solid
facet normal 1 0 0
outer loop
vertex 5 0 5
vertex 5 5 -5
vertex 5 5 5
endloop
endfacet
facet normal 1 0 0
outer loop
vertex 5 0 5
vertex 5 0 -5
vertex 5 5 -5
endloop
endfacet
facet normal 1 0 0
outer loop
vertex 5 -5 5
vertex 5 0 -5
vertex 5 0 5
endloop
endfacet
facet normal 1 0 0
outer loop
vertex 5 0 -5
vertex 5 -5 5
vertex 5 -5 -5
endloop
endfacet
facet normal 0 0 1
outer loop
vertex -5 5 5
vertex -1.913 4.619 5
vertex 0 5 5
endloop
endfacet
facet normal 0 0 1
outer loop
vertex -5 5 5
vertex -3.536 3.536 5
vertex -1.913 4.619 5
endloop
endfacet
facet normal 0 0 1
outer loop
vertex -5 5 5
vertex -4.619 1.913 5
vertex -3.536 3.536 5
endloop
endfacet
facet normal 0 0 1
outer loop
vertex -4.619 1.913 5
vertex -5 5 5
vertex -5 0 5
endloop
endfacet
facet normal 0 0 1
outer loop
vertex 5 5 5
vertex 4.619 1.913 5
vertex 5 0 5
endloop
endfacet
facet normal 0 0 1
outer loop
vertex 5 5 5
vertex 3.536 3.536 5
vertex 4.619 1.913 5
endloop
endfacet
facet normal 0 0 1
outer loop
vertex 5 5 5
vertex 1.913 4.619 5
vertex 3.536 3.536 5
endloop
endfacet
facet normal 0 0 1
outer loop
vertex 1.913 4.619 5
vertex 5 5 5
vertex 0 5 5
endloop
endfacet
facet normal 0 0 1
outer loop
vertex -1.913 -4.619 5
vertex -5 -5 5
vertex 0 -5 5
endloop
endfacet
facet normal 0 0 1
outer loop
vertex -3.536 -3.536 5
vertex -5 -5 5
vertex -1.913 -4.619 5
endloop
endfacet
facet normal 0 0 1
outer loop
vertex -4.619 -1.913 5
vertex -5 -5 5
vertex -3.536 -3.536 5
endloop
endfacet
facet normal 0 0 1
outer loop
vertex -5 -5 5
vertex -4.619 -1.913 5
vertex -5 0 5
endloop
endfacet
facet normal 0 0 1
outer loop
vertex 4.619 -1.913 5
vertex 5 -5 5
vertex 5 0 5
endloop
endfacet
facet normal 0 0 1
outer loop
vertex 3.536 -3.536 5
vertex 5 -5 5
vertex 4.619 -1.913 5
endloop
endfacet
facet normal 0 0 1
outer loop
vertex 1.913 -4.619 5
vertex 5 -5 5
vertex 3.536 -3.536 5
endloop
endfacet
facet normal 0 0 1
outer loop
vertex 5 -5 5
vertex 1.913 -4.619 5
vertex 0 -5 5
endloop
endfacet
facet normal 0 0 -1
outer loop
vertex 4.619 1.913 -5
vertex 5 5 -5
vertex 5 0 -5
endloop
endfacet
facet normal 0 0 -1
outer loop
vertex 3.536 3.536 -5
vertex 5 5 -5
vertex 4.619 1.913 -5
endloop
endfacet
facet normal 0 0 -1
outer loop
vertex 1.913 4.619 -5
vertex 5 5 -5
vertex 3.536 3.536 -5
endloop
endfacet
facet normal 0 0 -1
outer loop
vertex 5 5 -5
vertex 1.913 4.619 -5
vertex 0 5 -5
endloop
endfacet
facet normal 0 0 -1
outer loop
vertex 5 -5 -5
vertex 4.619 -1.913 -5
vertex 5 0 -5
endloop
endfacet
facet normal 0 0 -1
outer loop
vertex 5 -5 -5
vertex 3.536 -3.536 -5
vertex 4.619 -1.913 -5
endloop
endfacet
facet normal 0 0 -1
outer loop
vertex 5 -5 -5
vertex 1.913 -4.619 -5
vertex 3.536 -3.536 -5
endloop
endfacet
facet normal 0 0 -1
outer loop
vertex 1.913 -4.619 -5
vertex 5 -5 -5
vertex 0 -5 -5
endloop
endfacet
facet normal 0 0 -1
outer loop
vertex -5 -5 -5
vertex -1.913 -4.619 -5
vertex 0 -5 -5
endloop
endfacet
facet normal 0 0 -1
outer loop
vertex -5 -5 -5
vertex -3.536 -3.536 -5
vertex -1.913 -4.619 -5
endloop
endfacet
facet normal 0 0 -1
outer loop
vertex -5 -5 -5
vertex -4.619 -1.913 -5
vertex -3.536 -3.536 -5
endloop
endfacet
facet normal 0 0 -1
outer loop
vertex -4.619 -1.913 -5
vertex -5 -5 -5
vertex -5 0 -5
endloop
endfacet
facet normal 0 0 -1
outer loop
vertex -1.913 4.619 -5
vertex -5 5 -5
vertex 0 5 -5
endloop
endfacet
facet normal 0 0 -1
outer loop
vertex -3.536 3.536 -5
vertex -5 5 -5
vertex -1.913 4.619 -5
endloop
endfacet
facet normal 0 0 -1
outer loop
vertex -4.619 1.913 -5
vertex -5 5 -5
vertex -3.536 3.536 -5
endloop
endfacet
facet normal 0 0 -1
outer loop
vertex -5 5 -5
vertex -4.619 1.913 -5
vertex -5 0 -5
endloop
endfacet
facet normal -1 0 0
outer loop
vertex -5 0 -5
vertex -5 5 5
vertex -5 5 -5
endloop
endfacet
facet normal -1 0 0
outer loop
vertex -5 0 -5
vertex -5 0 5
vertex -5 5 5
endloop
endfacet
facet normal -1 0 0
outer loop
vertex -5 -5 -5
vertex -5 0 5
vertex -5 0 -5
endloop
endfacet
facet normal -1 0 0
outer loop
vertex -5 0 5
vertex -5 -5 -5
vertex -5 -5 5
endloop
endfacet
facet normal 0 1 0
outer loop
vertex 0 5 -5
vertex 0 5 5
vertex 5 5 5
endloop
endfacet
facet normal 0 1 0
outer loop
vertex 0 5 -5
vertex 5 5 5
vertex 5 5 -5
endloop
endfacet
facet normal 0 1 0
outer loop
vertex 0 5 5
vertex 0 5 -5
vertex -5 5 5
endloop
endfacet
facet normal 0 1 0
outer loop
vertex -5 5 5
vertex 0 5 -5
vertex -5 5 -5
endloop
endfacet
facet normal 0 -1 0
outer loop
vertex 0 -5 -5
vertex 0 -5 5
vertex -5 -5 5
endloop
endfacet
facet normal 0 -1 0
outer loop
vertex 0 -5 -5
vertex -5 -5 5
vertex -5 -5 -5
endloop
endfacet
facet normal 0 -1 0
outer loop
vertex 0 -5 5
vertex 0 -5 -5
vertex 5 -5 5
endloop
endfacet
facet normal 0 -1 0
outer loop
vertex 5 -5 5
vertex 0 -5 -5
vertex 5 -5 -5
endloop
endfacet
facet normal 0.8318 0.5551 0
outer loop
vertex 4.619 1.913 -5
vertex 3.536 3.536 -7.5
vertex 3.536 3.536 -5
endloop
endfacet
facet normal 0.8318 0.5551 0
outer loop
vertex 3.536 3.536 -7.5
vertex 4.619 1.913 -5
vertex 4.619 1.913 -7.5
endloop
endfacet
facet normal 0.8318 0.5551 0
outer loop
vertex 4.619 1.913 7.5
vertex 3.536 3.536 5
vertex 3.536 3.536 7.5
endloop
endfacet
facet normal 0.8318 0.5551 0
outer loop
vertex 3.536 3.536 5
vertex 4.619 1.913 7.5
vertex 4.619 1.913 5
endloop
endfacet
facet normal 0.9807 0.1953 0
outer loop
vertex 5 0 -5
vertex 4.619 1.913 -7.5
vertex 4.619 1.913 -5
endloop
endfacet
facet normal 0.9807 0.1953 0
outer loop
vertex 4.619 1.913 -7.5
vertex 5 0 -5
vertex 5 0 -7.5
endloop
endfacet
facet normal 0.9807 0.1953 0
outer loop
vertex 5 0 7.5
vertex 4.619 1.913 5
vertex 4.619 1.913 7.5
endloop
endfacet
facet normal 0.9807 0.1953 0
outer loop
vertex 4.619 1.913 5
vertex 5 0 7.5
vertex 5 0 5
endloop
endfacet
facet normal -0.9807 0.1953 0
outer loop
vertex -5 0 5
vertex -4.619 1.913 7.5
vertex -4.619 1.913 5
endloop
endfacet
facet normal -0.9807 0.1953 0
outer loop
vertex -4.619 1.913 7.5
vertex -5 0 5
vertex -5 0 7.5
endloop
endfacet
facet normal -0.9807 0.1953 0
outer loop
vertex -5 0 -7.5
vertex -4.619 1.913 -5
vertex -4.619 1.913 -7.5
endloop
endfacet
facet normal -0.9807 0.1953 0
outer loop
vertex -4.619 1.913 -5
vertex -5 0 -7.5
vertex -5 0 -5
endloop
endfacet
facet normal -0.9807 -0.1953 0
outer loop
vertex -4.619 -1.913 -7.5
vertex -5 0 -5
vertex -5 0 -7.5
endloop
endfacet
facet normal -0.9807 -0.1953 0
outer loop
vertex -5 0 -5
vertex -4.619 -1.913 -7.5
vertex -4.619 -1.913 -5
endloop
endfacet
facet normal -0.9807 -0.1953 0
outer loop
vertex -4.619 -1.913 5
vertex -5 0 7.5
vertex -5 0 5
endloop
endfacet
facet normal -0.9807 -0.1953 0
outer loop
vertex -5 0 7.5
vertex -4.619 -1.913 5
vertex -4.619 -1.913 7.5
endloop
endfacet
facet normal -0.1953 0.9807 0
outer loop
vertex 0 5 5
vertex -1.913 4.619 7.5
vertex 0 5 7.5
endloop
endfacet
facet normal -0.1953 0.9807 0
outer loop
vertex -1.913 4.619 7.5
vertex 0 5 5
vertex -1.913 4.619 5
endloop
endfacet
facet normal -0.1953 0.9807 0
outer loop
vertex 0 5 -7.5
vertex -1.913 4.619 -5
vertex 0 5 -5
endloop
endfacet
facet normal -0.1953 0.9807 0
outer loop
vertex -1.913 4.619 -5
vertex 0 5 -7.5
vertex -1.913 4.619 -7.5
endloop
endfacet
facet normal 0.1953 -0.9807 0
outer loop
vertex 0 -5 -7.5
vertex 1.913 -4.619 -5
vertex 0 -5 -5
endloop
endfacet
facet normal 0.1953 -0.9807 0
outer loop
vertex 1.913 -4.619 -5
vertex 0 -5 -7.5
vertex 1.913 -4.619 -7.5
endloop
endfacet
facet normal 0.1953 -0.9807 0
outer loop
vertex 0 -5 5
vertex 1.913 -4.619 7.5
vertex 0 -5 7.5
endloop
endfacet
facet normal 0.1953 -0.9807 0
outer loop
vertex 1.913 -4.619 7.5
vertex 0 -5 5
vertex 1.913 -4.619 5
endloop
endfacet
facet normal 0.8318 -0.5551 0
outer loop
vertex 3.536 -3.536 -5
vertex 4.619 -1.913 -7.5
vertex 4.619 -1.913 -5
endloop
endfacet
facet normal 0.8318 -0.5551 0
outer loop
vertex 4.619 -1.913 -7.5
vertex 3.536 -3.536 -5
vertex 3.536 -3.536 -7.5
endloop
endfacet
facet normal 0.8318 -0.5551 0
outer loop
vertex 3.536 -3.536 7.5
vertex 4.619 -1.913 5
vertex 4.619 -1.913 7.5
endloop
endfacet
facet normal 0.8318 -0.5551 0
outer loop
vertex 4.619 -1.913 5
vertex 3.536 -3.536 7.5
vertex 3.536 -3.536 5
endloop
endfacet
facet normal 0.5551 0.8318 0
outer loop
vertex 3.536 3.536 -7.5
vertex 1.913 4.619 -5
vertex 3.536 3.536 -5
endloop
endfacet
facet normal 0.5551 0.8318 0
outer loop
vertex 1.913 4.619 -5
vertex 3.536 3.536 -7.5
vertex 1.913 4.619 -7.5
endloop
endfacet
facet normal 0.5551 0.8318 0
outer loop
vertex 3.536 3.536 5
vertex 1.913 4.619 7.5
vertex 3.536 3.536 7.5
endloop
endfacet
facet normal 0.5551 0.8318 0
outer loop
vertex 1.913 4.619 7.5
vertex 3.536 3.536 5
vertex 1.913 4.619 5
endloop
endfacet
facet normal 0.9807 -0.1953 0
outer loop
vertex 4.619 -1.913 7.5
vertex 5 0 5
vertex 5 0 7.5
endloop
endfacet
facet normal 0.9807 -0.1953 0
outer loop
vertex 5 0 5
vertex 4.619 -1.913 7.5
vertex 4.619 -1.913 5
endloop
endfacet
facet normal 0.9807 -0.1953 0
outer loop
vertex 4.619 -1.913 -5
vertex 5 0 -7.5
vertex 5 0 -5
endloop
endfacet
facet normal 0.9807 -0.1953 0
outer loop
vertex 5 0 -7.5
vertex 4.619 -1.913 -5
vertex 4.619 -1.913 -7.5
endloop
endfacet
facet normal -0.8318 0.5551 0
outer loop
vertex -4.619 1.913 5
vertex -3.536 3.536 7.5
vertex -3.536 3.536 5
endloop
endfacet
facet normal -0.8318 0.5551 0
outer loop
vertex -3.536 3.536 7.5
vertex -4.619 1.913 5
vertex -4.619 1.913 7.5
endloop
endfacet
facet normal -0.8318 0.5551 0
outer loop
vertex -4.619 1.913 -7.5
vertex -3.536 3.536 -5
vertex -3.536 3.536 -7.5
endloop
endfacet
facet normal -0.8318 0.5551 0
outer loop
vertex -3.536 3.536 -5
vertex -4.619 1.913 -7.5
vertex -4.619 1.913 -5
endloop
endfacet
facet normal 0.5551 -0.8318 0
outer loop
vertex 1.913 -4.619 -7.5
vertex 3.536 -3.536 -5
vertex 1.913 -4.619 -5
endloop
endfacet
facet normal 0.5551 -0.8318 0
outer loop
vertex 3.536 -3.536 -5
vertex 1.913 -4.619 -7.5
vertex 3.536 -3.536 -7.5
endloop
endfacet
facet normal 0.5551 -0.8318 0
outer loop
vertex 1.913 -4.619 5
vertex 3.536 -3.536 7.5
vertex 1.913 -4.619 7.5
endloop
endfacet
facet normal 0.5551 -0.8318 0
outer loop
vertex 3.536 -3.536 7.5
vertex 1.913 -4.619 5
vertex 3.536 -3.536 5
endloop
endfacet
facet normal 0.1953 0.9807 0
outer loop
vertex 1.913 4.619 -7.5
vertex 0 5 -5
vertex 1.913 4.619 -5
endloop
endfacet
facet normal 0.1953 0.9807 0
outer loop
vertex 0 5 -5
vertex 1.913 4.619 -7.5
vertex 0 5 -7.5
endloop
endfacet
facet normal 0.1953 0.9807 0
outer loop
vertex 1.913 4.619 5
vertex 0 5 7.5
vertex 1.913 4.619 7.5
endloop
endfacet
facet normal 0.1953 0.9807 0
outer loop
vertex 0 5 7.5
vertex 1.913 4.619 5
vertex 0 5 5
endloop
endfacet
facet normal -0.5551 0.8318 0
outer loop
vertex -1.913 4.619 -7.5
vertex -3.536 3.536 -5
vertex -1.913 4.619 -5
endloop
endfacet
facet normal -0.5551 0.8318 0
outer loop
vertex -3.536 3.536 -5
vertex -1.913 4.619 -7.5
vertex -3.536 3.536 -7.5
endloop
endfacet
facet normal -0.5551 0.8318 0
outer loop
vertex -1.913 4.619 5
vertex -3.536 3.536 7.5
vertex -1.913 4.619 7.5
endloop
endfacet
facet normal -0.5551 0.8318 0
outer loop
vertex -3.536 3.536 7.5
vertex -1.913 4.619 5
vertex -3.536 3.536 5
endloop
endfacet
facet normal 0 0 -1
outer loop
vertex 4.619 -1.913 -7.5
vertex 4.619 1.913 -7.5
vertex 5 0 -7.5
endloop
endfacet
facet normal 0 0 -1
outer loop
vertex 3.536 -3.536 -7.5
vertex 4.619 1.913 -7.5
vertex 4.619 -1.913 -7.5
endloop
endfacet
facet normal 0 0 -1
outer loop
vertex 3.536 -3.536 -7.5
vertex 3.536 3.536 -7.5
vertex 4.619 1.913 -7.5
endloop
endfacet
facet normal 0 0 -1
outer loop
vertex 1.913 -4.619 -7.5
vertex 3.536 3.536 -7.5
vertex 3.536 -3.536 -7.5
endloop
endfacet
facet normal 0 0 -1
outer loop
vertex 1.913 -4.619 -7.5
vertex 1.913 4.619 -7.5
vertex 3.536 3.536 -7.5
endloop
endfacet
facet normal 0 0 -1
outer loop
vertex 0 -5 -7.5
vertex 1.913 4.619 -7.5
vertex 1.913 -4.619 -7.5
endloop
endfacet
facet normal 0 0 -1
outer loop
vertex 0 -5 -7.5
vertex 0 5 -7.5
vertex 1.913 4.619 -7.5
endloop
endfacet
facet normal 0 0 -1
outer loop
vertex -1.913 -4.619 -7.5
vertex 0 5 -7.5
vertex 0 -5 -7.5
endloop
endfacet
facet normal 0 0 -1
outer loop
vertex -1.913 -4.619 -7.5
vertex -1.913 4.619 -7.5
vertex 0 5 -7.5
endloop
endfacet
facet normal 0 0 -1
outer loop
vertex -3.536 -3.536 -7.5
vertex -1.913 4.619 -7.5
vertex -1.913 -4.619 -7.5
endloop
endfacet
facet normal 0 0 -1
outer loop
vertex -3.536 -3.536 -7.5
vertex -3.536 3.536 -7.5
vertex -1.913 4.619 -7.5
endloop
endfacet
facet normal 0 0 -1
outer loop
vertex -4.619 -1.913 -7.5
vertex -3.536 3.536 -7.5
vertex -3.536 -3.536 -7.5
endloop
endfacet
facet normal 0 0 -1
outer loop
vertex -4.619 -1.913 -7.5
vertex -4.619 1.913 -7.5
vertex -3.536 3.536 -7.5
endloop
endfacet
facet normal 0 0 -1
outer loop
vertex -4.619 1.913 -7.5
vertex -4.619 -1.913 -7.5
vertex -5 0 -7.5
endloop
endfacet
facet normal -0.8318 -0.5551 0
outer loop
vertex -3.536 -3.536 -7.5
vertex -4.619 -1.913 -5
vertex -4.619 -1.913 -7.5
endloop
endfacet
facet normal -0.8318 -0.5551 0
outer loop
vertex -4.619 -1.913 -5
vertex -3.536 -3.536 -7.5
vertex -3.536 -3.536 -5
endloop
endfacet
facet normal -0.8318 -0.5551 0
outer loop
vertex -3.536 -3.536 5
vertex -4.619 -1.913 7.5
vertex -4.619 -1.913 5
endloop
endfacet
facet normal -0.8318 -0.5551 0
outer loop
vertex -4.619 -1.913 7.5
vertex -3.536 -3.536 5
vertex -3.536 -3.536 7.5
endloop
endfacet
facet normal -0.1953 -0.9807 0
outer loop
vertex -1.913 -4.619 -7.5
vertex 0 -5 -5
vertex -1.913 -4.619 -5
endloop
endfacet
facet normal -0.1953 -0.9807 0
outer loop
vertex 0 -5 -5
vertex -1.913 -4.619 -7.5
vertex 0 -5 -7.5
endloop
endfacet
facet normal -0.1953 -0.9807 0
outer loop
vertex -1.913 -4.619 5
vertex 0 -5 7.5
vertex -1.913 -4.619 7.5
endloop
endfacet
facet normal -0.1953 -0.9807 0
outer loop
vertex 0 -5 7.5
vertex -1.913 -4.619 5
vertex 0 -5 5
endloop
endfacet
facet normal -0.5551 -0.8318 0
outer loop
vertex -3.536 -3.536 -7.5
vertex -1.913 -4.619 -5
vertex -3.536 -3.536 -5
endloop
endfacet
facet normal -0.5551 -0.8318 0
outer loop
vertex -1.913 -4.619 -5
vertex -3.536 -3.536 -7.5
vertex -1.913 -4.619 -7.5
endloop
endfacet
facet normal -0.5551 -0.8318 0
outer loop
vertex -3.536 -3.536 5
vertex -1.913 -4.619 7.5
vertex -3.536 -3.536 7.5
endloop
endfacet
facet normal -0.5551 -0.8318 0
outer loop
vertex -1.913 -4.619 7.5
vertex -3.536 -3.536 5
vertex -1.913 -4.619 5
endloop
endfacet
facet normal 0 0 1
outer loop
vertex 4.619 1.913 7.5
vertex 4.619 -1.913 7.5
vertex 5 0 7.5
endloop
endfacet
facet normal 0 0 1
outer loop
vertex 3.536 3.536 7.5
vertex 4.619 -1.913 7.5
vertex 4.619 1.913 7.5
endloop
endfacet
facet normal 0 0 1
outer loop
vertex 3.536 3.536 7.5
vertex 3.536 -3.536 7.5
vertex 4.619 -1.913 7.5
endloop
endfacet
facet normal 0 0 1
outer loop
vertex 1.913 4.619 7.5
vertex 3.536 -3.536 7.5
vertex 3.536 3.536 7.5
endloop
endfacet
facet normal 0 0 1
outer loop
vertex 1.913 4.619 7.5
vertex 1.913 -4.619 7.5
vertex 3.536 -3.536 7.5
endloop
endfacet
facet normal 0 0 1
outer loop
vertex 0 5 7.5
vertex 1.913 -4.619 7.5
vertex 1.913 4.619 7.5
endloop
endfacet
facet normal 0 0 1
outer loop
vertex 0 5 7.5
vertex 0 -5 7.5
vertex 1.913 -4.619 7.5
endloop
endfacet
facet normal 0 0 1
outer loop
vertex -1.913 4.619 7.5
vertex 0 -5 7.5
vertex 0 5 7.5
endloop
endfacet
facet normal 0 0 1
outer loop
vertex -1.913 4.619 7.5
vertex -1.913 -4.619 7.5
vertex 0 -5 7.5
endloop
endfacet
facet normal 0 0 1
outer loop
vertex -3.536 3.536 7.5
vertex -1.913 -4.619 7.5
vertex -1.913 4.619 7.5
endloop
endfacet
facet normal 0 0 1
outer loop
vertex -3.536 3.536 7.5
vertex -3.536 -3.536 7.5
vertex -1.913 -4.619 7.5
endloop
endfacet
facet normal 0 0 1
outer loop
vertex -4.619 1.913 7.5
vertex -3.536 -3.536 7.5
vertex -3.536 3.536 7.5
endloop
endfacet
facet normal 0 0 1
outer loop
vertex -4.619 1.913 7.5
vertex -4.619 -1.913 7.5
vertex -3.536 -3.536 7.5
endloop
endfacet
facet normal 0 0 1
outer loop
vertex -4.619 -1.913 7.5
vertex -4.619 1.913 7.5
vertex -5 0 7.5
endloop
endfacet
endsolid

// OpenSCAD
// Cube and Cylinder combined
// The Cube is 10mm wide
// The Cylinder has a diameter of 10mm
// You wouldn't see the Cylinder
// But the Cylinder is higher (15mm)
cube(size = [10, 10, 10], center = true);
cylinder(d = 10, h = 15, center = true);
